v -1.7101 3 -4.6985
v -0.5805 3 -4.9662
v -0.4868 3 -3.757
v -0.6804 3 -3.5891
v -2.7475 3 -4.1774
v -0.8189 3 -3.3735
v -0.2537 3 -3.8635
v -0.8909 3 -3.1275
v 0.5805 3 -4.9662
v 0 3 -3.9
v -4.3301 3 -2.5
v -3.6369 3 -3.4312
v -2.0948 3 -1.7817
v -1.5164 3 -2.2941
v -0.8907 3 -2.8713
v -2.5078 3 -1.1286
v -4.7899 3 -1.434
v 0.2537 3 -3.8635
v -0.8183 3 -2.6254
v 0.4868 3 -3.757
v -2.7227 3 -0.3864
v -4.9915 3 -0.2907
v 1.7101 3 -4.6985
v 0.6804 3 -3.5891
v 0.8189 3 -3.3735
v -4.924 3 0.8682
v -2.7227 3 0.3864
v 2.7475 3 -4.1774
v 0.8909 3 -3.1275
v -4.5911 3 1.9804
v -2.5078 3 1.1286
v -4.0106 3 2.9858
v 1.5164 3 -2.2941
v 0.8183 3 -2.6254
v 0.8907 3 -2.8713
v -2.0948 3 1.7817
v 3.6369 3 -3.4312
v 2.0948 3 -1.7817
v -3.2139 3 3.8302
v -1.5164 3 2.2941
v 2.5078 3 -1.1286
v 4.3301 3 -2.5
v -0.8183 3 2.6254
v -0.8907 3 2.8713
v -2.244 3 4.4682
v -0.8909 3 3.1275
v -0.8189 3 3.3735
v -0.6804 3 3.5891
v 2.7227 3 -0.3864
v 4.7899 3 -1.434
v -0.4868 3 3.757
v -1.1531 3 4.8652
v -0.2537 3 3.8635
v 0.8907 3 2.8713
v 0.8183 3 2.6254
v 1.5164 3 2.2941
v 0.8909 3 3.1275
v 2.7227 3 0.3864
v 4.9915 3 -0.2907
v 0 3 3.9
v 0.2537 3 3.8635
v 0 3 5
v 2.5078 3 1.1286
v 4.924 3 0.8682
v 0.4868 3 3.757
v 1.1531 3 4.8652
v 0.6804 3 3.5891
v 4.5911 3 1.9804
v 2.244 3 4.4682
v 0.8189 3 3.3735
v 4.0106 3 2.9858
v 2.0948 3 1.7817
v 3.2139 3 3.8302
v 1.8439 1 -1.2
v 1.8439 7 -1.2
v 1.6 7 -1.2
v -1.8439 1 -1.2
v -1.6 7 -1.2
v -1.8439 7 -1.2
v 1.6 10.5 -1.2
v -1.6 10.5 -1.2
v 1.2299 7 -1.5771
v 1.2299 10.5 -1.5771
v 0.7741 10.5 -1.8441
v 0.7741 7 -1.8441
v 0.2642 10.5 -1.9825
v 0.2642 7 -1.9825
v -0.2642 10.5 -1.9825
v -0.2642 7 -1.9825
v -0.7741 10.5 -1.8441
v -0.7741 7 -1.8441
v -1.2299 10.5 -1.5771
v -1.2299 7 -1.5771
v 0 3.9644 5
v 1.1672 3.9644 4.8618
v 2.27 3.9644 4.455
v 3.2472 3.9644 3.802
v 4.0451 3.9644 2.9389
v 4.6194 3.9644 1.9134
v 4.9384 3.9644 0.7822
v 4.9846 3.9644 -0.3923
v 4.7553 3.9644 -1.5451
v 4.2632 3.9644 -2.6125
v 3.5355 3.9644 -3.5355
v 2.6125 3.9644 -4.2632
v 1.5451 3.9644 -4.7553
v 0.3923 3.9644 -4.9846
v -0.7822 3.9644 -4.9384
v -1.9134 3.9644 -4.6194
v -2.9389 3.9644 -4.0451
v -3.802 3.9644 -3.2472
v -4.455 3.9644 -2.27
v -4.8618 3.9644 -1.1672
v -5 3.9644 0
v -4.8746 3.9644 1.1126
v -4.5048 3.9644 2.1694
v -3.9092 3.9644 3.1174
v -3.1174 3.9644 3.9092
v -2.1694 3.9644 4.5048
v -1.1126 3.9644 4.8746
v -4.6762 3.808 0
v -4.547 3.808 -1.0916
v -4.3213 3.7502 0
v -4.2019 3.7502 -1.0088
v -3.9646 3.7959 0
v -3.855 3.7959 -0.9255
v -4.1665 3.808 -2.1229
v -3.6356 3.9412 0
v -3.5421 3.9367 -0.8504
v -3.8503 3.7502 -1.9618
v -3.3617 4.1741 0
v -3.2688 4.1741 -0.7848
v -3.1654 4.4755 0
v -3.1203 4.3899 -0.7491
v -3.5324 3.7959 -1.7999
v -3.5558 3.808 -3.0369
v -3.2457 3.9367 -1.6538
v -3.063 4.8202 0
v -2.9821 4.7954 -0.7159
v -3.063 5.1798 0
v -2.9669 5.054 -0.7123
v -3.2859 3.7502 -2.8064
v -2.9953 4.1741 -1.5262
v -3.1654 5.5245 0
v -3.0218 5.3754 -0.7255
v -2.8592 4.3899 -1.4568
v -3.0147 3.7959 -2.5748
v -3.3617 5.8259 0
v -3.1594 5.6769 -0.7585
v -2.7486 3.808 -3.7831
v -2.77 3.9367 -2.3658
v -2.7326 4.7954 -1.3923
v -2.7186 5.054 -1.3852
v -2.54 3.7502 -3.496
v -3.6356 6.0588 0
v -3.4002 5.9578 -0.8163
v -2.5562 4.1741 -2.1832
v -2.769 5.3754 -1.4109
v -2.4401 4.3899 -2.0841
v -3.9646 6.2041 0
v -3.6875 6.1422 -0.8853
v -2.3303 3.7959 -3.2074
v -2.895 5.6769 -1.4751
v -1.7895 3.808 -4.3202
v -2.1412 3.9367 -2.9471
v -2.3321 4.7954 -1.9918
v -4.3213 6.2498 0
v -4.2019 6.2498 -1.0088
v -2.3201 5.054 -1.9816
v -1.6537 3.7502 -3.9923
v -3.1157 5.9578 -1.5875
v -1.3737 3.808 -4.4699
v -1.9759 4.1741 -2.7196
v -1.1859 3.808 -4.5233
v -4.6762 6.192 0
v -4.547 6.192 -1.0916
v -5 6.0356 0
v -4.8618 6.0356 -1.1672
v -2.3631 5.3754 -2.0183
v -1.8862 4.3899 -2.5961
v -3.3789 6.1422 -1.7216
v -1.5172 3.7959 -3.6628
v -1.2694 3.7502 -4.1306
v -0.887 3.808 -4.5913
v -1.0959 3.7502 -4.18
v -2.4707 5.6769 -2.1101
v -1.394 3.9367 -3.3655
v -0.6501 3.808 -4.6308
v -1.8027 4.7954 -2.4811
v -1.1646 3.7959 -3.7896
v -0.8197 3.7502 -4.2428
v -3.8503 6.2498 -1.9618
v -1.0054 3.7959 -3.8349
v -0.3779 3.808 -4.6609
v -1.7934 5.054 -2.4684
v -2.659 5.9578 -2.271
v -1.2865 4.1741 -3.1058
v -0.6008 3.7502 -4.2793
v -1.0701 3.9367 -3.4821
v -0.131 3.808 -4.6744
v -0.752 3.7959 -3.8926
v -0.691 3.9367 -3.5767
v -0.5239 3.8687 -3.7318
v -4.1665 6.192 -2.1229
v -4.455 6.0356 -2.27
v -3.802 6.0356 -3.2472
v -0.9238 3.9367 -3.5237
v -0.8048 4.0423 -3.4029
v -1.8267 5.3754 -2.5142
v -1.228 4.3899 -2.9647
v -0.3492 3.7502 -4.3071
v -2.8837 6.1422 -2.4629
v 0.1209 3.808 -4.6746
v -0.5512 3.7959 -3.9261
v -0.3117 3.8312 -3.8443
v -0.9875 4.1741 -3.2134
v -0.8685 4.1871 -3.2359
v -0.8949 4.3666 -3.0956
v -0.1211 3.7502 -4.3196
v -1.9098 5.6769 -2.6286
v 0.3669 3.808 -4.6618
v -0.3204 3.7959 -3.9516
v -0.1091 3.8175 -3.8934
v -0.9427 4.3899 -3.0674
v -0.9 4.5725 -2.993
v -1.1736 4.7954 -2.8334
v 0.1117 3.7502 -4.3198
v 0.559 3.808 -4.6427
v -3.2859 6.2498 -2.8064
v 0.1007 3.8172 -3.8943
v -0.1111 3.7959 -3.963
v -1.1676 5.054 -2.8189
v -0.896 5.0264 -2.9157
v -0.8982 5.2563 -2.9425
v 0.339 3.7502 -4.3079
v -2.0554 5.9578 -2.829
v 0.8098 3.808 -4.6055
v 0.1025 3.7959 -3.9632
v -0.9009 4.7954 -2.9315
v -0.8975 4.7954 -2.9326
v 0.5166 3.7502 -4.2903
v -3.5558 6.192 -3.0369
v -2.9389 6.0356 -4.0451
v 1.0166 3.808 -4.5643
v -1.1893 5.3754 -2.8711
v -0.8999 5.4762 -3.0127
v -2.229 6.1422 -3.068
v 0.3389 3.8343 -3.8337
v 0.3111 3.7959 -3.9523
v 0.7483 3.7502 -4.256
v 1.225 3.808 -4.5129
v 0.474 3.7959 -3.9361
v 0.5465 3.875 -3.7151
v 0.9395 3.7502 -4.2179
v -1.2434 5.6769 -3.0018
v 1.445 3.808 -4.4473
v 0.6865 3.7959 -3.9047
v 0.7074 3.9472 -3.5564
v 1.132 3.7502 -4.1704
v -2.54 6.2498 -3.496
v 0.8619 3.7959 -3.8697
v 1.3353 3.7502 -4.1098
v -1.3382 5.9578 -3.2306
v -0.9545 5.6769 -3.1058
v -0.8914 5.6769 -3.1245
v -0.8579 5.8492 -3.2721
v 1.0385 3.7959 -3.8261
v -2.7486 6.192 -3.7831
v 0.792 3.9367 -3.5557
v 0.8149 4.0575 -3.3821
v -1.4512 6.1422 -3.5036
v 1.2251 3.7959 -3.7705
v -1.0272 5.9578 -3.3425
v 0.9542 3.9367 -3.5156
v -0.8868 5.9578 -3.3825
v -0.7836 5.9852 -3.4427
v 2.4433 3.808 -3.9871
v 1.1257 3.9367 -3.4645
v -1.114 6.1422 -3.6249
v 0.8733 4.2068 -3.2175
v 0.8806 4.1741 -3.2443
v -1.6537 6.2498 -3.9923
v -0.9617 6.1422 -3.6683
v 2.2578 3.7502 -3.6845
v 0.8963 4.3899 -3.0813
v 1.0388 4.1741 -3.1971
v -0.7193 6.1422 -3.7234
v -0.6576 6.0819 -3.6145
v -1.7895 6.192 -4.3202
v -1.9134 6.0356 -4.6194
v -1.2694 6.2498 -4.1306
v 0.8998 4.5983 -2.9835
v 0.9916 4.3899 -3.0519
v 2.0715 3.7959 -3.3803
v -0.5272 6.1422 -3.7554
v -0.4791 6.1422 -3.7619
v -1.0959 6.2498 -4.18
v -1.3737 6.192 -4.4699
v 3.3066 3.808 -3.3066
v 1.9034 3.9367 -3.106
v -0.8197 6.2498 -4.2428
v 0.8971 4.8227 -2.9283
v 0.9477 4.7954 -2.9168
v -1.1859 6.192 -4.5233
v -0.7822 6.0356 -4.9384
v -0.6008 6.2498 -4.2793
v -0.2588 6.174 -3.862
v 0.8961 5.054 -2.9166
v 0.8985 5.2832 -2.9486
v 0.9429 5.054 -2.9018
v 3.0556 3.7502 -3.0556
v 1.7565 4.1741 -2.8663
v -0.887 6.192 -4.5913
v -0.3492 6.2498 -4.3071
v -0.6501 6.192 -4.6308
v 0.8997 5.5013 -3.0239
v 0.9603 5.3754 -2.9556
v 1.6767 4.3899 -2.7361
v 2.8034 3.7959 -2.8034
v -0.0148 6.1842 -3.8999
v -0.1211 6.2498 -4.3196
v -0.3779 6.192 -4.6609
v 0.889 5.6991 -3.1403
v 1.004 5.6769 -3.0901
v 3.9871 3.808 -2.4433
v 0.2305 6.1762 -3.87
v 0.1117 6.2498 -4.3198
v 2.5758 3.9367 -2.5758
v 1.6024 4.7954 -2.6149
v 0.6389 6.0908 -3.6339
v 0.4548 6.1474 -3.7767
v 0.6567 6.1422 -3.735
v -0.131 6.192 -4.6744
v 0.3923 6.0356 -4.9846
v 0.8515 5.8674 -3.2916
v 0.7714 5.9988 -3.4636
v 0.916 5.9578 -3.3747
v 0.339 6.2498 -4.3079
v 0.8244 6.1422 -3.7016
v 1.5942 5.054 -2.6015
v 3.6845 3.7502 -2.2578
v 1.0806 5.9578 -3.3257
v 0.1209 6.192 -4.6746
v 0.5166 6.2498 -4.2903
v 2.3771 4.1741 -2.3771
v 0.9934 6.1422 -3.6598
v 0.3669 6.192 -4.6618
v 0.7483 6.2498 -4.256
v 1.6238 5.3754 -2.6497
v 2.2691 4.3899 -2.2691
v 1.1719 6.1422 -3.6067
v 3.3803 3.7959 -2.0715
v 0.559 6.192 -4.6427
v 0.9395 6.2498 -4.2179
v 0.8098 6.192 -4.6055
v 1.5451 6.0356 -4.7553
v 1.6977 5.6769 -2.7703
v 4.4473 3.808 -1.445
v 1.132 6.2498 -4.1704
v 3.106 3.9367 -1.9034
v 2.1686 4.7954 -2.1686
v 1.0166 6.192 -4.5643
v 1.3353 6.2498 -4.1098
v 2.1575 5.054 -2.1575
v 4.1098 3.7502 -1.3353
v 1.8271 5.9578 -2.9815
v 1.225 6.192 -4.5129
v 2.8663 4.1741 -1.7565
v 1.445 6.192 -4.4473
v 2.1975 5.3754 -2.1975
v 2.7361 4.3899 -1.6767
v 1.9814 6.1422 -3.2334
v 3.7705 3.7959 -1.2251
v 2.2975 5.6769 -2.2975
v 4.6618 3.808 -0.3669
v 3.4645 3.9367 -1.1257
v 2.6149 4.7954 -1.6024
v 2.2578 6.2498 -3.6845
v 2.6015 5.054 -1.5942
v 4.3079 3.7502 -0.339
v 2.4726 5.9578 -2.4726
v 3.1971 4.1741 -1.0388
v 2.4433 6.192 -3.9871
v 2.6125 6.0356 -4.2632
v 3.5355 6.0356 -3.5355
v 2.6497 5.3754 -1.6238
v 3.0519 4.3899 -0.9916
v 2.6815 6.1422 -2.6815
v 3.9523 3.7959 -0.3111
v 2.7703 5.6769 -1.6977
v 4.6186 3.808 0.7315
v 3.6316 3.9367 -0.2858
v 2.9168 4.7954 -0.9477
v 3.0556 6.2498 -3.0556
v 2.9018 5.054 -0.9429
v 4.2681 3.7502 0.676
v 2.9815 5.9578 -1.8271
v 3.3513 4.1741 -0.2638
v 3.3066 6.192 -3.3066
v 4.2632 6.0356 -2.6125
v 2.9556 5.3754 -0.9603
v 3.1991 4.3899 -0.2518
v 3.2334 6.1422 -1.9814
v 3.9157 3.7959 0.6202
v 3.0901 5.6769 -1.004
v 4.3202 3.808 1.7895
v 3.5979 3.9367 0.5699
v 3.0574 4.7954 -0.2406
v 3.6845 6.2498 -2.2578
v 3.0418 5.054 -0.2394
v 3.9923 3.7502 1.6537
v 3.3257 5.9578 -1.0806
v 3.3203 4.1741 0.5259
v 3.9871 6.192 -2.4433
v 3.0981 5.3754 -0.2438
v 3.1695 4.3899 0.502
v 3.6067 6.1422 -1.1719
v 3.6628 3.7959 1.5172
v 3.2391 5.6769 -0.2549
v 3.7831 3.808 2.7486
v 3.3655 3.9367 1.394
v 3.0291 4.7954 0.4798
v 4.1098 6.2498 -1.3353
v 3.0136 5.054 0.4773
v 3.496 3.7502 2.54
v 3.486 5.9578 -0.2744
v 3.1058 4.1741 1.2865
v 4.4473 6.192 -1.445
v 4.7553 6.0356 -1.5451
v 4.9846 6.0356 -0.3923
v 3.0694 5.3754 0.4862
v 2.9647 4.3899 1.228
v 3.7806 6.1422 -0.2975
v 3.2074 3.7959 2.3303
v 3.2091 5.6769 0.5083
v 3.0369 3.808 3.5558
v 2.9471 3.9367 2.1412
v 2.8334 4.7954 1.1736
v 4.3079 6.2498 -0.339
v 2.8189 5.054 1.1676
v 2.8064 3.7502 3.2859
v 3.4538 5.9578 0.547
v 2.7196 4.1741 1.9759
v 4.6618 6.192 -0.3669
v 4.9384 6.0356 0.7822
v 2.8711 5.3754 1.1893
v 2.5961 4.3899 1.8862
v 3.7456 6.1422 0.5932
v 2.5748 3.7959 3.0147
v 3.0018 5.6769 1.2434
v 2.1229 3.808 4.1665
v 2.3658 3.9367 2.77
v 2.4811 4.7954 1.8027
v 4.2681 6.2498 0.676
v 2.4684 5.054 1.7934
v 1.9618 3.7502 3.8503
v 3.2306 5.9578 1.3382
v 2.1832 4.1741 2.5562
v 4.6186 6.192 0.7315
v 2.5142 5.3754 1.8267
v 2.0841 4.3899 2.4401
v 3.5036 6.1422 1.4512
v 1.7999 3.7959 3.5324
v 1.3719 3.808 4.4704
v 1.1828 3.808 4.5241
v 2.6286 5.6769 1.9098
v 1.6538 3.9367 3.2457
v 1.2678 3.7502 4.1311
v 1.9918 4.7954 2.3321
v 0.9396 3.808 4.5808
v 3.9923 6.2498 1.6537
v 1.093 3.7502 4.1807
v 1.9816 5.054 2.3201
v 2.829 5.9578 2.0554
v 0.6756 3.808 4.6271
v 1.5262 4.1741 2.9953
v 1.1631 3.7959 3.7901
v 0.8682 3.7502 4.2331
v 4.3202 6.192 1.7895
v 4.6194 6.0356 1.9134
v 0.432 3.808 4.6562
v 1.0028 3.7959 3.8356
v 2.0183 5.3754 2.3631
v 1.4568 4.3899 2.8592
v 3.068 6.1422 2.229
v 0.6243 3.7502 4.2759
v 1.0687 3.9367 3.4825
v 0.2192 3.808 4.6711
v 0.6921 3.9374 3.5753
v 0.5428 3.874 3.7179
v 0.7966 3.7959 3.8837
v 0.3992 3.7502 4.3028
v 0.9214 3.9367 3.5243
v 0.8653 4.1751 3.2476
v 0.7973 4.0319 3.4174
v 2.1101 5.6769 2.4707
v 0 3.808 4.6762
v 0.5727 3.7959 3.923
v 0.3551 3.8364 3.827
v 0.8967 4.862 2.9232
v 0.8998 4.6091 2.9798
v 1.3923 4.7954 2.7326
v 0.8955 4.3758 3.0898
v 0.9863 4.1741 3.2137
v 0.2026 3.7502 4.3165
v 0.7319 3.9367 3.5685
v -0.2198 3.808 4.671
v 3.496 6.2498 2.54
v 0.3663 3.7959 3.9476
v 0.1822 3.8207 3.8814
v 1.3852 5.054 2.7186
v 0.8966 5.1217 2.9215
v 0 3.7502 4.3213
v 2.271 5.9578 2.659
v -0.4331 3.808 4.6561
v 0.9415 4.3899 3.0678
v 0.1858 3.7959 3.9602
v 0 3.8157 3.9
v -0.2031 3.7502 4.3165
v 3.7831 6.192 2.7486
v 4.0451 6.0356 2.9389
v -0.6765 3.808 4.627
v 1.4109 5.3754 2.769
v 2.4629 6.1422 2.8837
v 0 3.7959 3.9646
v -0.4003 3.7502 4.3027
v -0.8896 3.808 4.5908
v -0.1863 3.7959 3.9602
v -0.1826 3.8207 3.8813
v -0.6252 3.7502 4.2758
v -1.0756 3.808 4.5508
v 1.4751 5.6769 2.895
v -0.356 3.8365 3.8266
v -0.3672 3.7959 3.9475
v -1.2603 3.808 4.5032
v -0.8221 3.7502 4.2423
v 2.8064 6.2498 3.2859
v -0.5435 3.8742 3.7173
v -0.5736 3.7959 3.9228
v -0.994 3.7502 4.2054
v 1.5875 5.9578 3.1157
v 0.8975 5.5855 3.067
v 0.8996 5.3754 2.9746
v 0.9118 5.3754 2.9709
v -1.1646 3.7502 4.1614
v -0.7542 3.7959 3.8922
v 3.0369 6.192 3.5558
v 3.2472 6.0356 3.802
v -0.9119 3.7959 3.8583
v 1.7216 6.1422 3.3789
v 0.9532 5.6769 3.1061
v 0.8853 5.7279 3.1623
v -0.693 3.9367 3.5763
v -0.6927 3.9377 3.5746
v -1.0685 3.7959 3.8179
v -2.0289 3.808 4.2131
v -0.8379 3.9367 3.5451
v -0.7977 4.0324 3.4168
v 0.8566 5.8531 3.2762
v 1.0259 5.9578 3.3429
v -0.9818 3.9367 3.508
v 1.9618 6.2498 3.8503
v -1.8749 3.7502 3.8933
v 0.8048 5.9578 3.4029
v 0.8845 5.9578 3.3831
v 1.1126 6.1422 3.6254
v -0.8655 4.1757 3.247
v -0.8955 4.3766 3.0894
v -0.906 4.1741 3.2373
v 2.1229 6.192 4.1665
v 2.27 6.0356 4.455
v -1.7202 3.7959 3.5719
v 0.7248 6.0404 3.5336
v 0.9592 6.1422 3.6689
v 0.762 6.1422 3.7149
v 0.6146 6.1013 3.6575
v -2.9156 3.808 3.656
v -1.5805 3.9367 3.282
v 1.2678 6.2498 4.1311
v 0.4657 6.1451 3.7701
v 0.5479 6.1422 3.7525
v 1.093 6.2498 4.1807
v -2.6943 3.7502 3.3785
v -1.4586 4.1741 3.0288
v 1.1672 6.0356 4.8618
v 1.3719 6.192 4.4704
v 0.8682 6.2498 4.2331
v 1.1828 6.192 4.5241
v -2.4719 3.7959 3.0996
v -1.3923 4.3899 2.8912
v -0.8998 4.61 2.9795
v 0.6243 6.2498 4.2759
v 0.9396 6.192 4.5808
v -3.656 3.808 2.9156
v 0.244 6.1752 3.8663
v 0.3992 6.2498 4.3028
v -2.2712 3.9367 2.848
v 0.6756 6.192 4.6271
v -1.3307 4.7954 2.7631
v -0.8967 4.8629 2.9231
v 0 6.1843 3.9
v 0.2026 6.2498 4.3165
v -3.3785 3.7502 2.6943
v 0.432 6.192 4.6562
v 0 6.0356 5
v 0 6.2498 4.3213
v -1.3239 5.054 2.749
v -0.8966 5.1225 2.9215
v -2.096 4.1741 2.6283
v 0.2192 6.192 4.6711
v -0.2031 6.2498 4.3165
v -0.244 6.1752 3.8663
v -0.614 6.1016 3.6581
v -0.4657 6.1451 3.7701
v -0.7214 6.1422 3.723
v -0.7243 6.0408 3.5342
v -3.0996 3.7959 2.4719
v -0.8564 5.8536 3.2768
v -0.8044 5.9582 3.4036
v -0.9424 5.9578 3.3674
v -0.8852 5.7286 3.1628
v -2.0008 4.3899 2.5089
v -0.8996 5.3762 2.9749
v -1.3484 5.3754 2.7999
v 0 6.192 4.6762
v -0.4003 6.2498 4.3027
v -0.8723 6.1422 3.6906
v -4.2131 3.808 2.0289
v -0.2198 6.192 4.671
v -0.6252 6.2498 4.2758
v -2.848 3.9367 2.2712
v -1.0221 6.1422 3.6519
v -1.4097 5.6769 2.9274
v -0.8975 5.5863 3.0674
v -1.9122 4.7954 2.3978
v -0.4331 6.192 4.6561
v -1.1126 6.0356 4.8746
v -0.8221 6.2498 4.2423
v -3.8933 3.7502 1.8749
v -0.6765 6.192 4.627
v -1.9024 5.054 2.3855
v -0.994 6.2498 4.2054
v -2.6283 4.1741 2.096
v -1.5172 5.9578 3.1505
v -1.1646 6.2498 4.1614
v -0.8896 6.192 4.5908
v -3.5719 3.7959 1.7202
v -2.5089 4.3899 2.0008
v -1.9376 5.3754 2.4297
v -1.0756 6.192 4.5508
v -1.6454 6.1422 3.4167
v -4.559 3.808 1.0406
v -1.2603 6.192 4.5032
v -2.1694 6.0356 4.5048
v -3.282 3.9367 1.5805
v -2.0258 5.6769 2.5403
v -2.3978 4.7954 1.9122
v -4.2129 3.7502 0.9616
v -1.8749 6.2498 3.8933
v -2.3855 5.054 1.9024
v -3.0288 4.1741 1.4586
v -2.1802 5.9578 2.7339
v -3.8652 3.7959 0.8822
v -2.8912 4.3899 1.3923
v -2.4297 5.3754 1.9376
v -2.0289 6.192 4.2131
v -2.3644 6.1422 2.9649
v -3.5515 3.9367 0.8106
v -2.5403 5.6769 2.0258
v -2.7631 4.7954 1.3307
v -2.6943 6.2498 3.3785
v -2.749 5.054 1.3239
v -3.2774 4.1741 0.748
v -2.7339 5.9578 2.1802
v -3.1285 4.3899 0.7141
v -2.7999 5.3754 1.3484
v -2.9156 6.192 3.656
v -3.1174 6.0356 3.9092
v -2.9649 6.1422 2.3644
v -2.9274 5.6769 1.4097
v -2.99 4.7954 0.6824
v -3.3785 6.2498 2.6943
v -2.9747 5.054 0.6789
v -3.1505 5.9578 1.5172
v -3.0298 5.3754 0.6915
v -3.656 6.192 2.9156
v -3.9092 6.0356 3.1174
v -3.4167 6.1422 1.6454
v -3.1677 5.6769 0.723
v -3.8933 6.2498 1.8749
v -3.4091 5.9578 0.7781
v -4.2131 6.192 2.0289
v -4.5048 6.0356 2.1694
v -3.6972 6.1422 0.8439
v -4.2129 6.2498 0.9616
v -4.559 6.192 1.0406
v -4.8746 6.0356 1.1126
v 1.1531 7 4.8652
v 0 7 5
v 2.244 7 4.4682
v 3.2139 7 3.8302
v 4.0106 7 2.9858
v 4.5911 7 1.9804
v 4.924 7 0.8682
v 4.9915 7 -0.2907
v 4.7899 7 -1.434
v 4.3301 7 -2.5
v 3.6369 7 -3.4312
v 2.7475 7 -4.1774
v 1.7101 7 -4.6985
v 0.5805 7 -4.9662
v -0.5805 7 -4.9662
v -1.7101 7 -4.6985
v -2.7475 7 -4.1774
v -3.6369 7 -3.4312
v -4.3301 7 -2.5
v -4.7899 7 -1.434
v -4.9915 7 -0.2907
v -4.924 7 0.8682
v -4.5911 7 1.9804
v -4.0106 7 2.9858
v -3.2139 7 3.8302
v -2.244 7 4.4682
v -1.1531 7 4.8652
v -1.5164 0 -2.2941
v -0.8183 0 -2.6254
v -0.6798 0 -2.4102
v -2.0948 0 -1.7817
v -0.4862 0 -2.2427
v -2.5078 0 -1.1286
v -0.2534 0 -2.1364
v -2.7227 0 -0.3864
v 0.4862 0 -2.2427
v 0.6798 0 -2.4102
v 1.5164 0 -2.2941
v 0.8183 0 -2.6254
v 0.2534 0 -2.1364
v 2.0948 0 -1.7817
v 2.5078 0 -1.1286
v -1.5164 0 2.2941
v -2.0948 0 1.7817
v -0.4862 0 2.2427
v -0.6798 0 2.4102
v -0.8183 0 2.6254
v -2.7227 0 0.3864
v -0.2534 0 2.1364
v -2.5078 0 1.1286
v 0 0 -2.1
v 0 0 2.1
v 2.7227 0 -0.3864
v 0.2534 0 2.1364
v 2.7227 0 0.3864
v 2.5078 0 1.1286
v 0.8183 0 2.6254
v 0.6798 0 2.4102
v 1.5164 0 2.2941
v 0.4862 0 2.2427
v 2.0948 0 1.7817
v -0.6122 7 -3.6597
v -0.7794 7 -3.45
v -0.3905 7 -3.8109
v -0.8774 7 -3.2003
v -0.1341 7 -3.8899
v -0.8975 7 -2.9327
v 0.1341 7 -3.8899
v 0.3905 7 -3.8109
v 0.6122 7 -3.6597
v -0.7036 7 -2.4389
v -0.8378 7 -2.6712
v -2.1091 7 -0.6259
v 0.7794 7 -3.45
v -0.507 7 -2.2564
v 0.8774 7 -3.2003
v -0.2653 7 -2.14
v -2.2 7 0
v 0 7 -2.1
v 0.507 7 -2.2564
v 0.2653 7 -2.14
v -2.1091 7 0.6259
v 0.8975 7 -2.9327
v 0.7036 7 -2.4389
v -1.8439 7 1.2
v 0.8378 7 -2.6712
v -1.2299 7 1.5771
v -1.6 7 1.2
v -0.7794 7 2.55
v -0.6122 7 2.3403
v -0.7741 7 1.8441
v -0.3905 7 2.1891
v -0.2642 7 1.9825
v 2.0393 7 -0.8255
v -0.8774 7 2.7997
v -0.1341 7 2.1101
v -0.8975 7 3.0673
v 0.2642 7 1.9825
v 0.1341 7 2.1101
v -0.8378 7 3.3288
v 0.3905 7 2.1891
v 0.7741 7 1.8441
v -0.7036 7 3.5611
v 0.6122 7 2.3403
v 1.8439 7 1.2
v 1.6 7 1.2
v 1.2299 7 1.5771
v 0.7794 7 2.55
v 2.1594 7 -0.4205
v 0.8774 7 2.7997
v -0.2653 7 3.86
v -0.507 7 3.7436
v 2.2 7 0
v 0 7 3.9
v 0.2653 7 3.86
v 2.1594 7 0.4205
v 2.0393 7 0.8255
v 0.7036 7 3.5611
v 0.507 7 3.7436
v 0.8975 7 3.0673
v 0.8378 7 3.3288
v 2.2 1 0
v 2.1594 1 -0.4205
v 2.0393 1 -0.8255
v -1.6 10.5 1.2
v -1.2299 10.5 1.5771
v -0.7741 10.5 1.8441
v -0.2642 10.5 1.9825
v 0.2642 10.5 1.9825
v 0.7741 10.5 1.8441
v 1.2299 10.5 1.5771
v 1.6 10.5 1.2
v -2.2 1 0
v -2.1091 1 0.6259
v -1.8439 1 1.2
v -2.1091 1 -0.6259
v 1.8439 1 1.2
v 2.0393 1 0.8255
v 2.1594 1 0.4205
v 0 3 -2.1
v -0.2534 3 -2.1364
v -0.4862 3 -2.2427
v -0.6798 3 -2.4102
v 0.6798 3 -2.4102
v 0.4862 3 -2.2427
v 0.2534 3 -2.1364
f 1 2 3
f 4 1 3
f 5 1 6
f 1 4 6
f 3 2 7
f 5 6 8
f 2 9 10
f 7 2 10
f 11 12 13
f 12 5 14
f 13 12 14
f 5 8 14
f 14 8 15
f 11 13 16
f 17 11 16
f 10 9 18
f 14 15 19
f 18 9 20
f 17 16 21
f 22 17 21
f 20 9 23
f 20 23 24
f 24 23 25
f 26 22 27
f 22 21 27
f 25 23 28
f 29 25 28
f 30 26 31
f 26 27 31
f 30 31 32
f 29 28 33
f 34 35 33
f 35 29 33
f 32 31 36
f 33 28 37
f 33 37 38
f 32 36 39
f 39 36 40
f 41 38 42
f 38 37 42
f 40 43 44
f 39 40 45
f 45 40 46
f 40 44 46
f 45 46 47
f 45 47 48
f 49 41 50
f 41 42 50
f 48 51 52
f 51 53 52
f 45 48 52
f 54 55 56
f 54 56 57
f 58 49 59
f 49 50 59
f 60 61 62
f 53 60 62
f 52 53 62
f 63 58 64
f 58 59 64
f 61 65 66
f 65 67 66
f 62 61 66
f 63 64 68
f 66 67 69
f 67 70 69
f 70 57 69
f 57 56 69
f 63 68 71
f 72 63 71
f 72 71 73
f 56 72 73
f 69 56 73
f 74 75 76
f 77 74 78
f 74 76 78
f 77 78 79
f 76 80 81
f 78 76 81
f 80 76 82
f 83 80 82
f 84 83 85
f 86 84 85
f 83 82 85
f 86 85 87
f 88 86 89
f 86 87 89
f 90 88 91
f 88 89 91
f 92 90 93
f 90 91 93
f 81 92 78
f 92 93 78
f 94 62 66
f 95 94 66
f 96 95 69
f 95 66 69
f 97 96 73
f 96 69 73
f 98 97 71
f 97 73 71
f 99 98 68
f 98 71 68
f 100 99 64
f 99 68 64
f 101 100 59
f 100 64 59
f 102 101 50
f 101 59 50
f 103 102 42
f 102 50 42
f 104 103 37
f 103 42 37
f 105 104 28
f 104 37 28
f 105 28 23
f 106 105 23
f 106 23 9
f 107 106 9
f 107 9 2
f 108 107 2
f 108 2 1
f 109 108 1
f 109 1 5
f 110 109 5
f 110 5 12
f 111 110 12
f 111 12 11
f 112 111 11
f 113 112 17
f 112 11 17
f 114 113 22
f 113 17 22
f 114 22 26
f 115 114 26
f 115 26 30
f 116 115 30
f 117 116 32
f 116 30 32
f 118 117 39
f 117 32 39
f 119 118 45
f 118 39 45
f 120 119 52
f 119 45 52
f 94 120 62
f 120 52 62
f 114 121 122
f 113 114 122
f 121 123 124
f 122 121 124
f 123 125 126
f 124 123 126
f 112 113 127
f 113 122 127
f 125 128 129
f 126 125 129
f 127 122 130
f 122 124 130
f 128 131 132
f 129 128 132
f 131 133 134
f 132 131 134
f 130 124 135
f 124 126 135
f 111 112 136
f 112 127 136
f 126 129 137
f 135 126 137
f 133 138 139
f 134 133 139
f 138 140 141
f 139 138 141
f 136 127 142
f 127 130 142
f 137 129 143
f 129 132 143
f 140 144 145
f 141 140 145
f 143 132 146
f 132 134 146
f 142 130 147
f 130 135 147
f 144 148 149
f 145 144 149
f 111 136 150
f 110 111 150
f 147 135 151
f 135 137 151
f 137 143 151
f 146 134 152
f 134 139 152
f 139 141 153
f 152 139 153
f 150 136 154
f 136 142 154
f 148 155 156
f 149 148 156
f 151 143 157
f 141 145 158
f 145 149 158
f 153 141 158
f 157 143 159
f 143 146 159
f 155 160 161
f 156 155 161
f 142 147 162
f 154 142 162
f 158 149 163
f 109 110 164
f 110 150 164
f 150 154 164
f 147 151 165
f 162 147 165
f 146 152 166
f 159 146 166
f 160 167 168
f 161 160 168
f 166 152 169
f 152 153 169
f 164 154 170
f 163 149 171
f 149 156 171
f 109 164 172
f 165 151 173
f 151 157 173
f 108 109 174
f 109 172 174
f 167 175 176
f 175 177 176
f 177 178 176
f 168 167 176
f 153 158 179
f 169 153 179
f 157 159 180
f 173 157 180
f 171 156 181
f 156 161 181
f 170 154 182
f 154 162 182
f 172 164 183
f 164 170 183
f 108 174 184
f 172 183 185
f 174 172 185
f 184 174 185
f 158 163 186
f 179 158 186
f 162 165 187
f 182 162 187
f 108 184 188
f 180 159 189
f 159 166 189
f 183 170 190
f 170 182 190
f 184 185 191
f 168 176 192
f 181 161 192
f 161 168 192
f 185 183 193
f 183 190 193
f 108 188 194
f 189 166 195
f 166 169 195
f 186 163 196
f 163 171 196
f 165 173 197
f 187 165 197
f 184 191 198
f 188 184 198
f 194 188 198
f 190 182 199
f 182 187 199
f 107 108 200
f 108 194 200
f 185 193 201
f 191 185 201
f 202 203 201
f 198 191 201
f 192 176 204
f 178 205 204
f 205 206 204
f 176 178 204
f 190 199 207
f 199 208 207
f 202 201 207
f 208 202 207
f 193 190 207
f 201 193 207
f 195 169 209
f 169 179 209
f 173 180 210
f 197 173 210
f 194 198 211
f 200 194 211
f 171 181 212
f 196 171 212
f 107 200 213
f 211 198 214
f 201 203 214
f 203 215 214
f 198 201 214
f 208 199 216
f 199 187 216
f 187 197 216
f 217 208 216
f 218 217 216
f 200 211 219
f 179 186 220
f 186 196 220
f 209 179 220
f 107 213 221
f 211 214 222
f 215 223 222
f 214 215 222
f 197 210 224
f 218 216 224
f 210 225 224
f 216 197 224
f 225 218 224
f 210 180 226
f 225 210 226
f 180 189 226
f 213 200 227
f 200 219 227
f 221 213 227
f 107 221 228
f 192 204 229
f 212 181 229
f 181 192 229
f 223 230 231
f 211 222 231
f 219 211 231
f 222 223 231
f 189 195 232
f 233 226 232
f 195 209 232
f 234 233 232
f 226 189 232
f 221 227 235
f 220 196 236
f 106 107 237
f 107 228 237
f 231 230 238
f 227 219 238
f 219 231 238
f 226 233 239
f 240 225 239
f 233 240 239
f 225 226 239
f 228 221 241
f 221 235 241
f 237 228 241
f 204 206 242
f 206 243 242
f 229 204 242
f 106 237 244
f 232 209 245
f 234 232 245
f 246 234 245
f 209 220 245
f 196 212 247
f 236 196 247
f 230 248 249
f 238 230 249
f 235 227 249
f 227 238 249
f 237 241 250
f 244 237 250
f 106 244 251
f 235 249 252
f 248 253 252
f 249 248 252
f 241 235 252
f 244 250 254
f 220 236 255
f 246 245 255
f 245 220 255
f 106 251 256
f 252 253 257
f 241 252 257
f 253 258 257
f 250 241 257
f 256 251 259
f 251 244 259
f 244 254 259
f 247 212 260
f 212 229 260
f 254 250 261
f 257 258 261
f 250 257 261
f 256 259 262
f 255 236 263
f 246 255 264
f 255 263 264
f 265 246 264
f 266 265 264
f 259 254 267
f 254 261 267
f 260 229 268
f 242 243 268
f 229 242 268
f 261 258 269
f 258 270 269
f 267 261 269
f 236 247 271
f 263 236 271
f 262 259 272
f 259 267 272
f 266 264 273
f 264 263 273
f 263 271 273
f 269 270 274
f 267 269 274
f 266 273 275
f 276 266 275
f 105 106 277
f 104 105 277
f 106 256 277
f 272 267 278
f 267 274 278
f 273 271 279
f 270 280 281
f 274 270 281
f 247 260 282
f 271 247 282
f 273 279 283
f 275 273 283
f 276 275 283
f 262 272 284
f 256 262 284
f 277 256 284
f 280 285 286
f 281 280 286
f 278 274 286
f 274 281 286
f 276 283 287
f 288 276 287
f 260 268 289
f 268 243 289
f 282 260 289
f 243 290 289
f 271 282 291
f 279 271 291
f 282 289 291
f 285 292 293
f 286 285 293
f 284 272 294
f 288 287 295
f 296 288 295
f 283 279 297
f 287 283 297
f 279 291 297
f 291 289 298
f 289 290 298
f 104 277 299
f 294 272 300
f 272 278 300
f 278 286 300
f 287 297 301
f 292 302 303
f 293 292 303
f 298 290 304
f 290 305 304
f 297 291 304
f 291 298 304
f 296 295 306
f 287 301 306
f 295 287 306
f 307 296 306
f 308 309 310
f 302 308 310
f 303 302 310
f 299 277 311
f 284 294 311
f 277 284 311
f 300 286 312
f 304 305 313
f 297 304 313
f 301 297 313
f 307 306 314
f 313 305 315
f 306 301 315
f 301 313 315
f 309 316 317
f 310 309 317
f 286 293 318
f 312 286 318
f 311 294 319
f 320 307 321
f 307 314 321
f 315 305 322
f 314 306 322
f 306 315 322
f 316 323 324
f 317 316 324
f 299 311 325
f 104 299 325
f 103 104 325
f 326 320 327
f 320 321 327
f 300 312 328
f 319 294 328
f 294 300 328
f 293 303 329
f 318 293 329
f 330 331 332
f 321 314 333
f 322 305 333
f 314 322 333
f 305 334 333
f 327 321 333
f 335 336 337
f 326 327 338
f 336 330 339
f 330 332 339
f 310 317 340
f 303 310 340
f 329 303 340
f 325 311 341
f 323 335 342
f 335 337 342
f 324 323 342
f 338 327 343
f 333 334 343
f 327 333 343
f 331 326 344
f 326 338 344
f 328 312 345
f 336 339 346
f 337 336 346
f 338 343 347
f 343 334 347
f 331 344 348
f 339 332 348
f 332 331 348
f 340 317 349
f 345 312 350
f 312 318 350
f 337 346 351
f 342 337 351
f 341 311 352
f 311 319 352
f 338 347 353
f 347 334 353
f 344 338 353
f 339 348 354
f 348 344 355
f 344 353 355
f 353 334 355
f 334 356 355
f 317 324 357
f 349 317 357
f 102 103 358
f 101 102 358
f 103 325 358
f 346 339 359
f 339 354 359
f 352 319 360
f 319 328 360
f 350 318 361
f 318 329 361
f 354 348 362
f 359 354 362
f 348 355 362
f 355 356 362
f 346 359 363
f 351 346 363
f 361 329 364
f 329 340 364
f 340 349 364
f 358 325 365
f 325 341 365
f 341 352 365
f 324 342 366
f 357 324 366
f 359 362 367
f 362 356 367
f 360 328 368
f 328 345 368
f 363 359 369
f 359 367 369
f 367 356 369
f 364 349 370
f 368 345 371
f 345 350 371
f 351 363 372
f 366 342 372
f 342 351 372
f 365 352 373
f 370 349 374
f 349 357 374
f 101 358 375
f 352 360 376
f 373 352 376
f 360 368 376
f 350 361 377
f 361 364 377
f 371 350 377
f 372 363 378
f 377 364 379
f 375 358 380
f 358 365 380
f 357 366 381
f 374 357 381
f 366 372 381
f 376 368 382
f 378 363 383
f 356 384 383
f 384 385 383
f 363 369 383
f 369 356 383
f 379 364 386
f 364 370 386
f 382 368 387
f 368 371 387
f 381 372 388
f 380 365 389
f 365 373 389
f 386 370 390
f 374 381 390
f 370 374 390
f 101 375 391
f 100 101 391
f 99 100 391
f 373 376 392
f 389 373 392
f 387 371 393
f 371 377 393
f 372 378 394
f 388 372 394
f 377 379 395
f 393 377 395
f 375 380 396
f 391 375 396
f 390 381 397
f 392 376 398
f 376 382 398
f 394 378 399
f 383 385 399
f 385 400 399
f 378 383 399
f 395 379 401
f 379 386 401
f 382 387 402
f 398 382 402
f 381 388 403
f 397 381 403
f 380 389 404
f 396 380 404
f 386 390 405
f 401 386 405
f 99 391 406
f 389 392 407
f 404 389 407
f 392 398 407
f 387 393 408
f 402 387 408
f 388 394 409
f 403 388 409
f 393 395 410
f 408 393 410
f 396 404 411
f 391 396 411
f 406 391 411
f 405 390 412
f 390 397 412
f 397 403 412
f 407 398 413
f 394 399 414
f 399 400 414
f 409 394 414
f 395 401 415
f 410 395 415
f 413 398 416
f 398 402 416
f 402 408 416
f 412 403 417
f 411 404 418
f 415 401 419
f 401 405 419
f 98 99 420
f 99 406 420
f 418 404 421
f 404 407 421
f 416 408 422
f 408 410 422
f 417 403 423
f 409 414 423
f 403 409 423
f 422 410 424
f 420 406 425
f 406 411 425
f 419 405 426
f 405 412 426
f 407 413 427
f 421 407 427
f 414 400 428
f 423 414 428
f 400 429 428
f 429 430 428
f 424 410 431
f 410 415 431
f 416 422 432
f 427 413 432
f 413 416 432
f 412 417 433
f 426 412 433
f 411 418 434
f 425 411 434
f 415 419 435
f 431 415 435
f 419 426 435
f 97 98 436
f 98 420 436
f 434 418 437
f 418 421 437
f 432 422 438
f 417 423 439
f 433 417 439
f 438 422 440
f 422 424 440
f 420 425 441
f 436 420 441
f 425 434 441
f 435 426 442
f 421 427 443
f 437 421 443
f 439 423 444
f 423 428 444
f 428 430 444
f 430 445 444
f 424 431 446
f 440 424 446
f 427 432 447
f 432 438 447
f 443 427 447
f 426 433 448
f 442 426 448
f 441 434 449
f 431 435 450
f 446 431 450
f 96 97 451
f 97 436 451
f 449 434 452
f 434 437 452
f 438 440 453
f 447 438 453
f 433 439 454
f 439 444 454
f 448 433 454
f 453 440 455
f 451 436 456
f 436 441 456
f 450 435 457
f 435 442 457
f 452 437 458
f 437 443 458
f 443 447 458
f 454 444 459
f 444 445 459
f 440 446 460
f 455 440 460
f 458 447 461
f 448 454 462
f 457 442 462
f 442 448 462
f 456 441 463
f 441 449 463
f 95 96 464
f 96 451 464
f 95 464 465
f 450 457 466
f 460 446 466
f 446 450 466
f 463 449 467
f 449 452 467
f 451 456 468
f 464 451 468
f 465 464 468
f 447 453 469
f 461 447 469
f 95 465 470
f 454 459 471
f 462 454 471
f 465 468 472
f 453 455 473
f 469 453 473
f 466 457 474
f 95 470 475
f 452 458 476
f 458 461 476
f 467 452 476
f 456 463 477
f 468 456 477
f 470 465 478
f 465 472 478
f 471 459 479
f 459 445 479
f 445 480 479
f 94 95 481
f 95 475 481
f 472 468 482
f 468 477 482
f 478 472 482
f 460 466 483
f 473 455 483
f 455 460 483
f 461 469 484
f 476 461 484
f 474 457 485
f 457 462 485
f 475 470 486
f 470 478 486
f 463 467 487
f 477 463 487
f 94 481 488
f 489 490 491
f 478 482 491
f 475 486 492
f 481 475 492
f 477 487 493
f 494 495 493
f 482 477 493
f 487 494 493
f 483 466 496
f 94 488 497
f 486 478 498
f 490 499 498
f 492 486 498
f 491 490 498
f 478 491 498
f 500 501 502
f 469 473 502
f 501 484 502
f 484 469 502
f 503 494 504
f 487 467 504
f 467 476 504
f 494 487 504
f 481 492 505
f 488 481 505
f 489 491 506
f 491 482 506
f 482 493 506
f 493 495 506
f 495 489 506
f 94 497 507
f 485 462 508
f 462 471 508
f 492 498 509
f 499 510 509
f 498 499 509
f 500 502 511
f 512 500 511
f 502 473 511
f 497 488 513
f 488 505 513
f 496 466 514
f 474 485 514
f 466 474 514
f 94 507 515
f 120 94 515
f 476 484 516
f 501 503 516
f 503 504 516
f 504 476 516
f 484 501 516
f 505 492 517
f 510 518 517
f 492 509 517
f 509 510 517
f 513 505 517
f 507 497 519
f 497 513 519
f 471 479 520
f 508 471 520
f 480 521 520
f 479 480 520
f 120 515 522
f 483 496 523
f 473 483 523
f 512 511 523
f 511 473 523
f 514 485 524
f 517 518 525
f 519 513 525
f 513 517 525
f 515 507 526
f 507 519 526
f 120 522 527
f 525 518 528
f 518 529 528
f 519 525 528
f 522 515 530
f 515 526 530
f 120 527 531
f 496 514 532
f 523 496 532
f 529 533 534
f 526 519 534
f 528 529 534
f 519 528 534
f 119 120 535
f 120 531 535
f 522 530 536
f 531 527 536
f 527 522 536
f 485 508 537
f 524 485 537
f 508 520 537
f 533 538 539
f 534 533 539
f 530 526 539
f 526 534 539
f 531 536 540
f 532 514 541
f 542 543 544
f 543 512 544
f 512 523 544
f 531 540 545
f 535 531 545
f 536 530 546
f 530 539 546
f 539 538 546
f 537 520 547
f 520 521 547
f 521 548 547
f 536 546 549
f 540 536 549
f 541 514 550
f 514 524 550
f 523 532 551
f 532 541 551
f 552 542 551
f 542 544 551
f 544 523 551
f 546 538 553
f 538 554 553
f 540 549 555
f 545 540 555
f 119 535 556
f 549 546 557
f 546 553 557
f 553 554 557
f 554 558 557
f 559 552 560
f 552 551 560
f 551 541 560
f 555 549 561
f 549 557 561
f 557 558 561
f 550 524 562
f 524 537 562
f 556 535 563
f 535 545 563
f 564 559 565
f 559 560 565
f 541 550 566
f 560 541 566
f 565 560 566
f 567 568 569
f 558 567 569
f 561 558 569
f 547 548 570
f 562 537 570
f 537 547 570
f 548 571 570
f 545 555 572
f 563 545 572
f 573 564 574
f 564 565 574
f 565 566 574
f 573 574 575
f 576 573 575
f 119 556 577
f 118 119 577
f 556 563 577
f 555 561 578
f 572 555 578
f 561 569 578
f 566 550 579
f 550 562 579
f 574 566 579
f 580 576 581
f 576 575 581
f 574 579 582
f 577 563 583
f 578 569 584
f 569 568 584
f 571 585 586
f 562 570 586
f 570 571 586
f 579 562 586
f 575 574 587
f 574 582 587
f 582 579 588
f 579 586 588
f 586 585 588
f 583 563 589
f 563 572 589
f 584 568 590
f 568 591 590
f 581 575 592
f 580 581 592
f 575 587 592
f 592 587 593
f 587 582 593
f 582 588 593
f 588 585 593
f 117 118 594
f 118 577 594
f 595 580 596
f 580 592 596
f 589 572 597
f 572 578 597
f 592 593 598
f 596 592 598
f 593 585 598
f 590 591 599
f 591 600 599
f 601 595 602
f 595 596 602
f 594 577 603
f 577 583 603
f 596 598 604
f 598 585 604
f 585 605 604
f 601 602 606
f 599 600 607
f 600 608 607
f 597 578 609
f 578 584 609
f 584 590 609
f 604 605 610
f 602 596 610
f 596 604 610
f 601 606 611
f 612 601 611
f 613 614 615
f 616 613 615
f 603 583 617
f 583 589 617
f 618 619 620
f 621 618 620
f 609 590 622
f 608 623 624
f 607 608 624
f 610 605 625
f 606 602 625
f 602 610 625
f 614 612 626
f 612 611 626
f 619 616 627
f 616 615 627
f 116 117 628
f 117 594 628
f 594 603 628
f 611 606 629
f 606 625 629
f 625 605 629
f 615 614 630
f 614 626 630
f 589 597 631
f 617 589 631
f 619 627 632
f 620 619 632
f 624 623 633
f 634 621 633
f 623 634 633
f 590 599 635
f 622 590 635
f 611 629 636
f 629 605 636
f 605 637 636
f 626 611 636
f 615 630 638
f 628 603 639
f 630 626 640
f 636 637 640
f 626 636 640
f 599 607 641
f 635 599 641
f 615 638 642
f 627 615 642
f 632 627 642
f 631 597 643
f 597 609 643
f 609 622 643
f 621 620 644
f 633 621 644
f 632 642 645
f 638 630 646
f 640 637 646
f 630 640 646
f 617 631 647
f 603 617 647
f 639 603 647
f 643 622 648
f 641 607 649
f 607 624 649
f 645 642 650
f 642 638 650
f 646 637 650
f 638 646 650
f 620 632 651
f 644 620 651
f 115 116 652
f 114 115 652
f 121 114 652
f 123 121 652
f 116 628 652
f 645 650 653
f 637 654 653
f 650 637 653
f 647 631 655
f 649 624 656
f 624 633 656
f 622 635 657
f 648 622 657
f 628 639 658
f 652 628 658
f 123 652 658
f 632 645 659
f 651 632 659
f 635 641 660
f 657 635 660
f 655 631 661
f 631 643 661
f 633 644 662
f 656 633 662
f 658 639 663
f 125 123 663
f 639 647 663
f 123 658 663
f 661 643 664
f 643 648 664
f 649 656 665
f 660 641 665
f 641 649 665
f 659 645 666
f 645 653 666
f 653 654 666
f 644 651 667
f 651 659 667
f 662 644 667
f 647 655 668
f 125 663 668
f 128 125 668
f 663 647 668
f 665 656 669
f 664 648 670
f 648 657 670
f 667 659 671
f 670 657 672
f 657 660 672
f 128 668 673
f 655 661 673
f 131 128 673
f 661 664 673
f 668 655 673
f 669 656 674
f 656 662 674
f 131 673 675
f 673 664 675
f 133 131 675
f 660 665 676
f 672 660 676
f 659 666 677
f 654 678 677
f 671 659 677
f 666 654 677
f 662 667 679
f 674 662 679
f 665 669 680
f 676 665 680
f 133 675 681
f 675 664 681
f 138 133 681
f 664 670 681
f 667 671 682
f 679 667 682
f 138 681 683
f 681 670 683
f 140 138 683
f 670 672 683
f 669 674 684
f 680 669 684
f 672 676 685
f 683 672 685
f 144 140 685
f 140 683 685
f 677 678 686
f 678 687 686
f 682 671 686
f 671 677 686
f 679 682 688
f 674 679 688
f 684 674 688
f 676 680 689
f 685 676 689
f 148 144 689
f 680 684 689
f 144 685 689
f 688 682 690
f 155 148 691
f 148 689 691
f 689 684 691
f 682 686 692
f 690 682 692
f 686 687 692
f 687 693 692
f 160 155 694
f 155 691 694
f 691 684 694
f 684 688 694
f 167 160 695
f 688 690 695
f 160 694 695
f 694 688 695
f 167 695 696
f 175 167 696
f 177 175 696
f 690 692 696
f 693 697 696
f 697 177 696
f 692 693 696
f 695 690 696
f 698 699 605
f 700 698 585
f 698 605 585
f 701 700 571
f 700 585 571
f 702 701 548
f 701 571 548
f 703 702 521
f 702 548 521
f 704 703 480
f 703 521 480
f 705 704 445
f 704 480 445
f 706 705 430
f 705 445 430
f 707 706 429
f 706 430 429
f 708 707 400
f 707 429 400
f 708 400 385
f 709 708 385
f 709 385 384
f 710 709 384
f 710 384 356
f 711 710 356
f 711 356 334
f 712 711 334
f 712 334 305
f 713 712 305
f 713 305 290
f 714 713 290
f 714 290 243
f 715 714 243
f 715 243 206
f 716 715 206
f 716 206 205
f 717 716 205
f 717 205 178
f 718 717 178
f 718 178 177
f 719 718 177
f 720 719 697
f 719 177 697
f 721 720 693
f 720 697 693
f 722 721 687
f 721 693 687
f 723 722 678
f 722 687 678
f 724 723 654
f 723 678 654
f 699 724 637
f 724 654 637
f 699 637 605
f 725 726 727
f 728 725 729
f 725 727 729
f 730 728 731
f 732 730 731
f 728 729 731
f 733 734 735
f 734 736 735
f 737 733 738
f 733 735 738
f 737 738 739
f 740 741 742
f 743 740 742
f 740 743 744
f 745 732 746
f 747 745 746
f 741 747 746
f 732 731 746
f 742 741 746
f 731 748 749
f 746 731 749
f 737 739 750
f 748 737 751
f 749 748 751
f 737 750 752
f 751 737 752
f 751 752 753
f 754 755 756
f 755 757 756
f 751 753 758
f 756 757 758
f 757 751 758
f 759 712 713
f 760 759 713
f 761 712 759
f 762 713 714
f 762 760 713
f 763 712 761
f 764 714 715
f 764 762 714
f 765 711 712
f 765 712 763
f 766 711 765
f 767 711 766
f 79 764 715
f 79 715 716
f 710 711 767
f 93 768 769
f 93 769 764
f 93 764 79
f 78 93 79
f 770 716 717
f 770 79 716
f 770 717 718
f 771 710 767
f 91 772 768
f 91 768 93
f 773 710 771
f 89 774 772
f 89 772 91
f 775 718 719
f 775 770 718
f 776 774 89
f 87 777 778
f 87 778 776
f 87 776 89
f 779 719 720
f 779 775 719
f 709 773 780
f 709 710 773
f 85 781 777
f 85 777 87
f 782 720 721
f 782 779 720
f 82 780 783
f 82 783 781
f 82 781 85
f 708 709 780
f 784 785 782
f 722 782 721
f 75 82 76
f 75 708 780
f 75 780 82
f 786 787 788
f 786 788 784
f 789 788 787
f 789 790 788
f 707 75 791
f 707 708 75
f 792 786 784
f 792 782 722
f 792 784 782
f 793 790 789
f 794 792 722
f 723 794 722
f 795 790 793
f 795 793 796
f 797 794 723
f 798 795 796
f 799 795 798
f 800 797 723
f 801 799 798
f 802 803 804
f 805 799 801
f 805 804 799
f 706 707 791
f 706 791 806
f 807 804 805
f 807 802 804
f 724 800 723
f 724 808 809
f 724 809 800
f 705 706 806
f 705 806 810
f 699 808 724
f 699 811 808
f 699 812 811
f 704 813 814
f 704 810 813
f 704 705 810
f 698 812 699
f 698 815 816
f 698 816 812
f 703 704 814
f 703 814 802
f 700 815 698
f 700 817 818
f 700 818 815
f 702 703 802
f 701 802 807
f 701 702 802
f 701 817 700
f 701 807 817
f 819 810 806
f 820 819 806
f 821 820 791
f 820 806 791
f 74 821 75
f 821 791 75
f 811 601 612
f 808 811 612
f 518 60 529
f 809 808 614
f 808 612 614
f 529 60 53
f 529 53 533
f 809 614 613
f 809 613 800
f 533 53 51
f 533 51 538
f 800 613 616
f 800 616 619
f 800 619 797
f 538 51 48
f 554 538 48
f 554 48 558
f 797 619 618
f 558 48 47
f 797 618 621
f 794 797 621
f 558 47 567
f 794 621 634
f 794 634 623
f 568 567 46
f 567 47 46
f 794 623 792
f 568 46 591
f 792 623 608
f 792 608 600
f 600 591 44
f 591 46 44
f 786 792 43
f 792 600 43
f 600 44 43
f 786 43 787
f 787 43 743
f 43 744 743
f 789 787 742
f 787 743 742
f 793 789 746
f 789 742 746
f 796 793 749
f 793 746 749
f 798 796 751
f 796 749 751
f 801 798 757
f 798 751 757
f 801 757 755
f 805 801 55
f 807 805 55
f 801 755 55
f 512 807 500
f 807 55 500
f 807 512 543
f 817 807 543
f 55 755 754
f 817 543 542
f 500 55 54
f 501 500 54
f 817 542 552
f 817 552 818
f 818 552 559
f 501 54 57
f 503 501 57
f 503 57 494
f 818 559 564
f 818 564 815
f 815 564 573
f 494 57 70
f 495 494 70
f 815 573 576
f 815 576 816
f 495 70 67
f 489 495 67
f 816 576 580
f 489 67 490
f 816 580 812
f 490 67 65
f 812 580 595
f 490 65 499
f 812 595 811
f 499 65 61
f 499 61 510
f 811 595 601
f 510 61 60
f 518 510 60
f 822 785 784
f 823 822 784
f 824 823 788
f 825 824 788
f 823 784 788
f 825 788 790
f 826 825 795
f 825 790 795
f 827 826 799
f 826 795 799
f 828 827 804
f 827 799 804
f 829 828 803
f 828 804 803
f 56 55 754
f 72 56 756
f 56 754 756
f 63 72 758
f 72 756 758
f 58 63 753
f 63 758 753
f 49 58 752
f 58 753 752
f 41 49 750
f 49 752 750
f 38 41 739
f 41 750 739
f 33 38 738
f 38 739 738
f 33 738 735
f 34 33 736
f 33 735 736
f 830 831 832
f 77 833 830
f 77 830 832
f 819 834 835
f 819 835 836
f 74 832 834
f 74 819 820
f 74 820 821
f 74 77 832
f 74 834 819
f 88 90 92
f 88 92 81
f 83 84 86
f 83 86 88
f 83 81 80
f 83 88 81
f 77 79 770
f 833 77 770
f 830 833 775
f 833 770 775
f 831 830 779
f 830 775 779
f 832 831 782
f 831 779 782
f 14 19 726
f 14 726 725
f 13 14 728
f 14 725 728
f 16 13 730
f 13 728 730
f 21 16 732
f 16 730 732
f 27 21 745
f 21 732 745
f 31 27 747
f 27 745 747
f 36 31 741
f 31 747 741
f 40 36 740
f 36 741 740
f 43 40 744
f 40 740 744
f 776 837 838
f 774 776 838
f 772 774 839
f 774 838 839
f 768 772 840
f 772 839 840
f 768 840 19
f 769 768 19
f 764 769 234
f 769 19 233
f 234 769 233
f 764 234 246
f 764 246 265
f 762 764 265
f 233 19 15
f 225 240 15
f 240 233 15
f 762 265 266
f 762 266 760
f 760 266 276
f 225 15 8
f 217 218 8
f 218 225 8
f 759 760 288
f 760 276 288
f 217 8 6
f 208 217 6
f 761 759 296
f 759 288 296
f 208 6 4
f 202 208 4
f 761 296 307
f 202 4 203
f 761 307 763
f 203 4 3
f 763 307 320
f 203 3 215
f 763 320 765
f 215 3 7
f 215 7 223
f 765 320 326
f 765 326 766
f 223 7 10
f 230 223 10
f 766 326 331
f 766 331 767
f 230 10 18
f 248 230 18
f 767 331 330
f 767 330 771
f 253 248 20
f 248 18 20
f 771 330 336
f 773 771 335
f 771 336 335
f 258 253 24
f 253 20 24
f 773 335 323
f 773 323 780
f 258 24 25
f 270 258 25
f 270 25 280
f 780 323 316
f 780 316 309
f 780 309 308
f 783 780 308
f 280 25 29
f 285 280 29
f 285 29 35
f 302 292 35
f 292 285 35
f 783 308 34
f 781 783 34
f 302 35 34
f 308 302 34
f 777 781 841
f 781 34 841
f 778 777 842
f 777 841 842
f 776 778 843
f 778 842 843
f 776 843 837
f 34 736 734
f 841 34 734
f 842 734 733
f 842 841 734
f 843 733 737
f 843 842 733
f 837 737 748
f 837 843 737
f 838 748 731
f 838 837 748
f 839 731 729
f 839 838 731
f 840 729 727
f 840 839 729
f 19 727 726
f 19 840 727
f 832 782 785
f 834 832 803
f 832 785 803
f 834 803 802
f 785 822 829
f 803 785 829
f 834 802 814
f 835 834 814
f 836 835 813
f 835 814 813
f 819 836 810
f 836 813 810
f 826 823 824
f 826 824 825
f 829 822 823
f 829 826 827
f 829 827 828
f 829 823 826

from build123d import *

# Parameters (mm, degrees)
SKETCH_1_R                      = 2.75
EXTRUDE_1_DEPTH                 = 7
CUT_EXTRUDE_1_DEPTH             = 6
EXTRUDE_2_DEPTH                 = 3.5
EXTRUDE_START                   = -4
SKETCH_5_R                      = 5
SKETCH_5_R_2                    = 2.75
EXTRUDE_3_DEPTH                 = 4
SWEEP_1_PROFILE_R               = 1.25
CUT_EXTRUDE_2_REACH             = 12.308
SKETCH_13_R                     = 0.9
CUT_EXTRUDE_2_DIRECTION_2_REACH = 12.308


with BuildPart() as part:
    # 草图1 → 凸台-拉伸1 (new body)
    with BuildSketch(Plane(origin=(0, 0, 0), x_dir=(1, 0, 0), z_dir=(0, 1, 0))):
        with Locations(Location((0, 0, 0), (0, 0, 270))):
            Circle(SKETCH_1_R)
    extrude(amount=EXTRUDE_1_DEPTH)

    # 草图2 → 切除-拉伸1 (cut)
    with BuildSketch(Plane(origin=(0, 7, 0), x_dir=(1, 0, 0), z_dir=(0, 1, 0))):
        with BuildLine():
            Line((1.843908891, 1.2), (-1.843908891, 1.2))
            ThreePointArc((-1.843908891, 1.2), (-2.2, 0), (-1.843908891, -1.2))
            Line((-1.843908891, -1.2), (1.843908891, -1.2))
            ThreePointArc((1.843908891, -1.2), (2.109099282, -0.625859584), (2.2, 0))
            ThreePointArc((2.2, 0), (2.109099282, 0.625859584), (1.843908891, 1.2))
        make_face()
    extrude(amount=-CUT_EXTRUDE_1_DEPTH, mode=Mode.SUBTRACT)

    # 草图4 → 凸台-拉伸2 (add)
    with BuildSketch(Plane(origin=(0, 7, 0), x_dir=(1, 0, 0), z_dir=(0, 1, 0))):
        with BuildLine():
            ThreePointArc((1.6, 1.2), (0, 2), (-1.6, 1.2))
            Line((-1.6, 1.2), (1.6, 1.2))
        make_face()
        with BuildLine():
            ThreePointArc((-1.6, -1.2), (0, -2), (1.6, -1.2))
            Line((1.6, -1.2), (-1.6, -1.2))
        make_face()
    extrude(amount=EXTRUDE_2_DEPTH)

    # 草图5 → 凸台-拉伸3 (add)
    with BuildSketch(Plane(origin=(0, 7, 0), x_dir=(1, 0, 0), z_dir=(0, 1, 0)).offset(EXTRUDE_START)):
        with Locations(Location((0, 0, 0), (0, 0, 270))):
            Circle(SKETCH_5_R)
        with Locations(Location((0, 0, 0), (0, 0, 270))):
            Circle(SKETCH_5_R_2, mode=Mode.SUBTRACT)
    extrude(amount=EXTRUDE_3_DEPTH)

    # 切除-扫描1: sweep along a path in 草图6
    with BuildLine(Plane(origin=(0, 5, 0), x_dir=(-1, 0, 0), z_dir=(0, -1, 0))) as sweep_1_path:
        CenterArc((0, 0), 4.3, 0, 360)
    # 切除-扫描1 profile (on start of the path) → 切除-扫描1 (sweep, cut)
    with BuildSketch(Plane(origin=(-4.3, 5, 0), x_dir=(-1, 0, 0), z_dir=(0, 0, -1))):
        Circle(SWEEP_1_PROFILE_R)
    sweep(path=sweep_1_path.line, mode=Mode.SUBTRACT)

    # 草图13 → 切除-拉伸2 (cut, up to next)
    with BuildSketch(Plane.XZ.offset(-3), mode=Mode.PRIVATE) as cut_extrude_2_sk1:
        with Locations(Location((0, 3, 0), (0, 0, 90))):
            Circle(SKETCH_13_R)
    cut_extrude_2_tool1 = extrude(cut_extrude_2_sk1.sketch, amount=-CUT_EXTRUDE_2_REACH, mode=Mode.PRIVATE) & part.part
    # 草图13 → 切除-拉伸2 (cut, up to next)
    with BuildSketch(Plane.XZ.offset(-3), mode=Mode.PRIVATE) as cut_extrude_2_sk2:
        with Locations(Location((0, -3, 0), (0, 0, 90))):
            Circle(SKETCH_13_R)
    cut_extrude_2_tool2 = extrude(cut_extrude_2_sk2.sketch, amount=-CUT_EXTRUDE_2_REACH, mode=Mode.PRIVATE) & part.part
    add(cut_extrude_2_tool1.solids().sort_by_distance((0, 3, 3))[0], mode=Mode.SUBTRACT)
    add(cut_extrude_2_tool2.solids().sort_by_distance((0, 3, -3))[0], mode=Mode.SUBTRACT)

    # 草图13 → 切除-拉伸2 direction 2 (cut, up to next)
    with BuildSketch(Plane.XZ.offset(-3), mode=Mode.PRIVATE) as cut_extrude_2_direction_2_sk1:
        with Locations(Location((0, 3, 0), (0, 0, 90))):
            Circle(SKETCH_13_R)
    cut_extrude_2_direction_2_tool1 = extrude(cut_extrude_2_direction_2_sk1.sketch, amount=CUT_EXTRUDE_2_DIRECTION_2_REACH, mode=Mode.PRIVATE) & part.part
    # 草图13 → 切除-拉伸2 direction 2 (cut, up to next)
    with BuildSketch(Plane.XZ.offset(-3), mode=Mode.PRIVATE) as cut_extrude_2_direction_2_sk2:
        with Locations(Location((0, -3, 0), (0, 0, 90))):
            Circle(SKETCH_13_R)
    cut_extrude_2_direction_2_tool2 = extrude(cut_extrude_2_direction_2_sk2.sketch, amount=CUT_EXTRUDE_2_DIRECTION_2_REACH, mode=Mode.PRIVATE) & part.part
    add(cut_extrude_2_direction_2_tool1.solids().sort_by_distance((0, 3, 3))[0], mode=Mode.SUBTRACT)
    add(cut_extrude_2_direction_2_tool2.solids().sort_by_distance((0, 3, -3))[0], mode=Mode.SUBTRACT)


solid = part.part
